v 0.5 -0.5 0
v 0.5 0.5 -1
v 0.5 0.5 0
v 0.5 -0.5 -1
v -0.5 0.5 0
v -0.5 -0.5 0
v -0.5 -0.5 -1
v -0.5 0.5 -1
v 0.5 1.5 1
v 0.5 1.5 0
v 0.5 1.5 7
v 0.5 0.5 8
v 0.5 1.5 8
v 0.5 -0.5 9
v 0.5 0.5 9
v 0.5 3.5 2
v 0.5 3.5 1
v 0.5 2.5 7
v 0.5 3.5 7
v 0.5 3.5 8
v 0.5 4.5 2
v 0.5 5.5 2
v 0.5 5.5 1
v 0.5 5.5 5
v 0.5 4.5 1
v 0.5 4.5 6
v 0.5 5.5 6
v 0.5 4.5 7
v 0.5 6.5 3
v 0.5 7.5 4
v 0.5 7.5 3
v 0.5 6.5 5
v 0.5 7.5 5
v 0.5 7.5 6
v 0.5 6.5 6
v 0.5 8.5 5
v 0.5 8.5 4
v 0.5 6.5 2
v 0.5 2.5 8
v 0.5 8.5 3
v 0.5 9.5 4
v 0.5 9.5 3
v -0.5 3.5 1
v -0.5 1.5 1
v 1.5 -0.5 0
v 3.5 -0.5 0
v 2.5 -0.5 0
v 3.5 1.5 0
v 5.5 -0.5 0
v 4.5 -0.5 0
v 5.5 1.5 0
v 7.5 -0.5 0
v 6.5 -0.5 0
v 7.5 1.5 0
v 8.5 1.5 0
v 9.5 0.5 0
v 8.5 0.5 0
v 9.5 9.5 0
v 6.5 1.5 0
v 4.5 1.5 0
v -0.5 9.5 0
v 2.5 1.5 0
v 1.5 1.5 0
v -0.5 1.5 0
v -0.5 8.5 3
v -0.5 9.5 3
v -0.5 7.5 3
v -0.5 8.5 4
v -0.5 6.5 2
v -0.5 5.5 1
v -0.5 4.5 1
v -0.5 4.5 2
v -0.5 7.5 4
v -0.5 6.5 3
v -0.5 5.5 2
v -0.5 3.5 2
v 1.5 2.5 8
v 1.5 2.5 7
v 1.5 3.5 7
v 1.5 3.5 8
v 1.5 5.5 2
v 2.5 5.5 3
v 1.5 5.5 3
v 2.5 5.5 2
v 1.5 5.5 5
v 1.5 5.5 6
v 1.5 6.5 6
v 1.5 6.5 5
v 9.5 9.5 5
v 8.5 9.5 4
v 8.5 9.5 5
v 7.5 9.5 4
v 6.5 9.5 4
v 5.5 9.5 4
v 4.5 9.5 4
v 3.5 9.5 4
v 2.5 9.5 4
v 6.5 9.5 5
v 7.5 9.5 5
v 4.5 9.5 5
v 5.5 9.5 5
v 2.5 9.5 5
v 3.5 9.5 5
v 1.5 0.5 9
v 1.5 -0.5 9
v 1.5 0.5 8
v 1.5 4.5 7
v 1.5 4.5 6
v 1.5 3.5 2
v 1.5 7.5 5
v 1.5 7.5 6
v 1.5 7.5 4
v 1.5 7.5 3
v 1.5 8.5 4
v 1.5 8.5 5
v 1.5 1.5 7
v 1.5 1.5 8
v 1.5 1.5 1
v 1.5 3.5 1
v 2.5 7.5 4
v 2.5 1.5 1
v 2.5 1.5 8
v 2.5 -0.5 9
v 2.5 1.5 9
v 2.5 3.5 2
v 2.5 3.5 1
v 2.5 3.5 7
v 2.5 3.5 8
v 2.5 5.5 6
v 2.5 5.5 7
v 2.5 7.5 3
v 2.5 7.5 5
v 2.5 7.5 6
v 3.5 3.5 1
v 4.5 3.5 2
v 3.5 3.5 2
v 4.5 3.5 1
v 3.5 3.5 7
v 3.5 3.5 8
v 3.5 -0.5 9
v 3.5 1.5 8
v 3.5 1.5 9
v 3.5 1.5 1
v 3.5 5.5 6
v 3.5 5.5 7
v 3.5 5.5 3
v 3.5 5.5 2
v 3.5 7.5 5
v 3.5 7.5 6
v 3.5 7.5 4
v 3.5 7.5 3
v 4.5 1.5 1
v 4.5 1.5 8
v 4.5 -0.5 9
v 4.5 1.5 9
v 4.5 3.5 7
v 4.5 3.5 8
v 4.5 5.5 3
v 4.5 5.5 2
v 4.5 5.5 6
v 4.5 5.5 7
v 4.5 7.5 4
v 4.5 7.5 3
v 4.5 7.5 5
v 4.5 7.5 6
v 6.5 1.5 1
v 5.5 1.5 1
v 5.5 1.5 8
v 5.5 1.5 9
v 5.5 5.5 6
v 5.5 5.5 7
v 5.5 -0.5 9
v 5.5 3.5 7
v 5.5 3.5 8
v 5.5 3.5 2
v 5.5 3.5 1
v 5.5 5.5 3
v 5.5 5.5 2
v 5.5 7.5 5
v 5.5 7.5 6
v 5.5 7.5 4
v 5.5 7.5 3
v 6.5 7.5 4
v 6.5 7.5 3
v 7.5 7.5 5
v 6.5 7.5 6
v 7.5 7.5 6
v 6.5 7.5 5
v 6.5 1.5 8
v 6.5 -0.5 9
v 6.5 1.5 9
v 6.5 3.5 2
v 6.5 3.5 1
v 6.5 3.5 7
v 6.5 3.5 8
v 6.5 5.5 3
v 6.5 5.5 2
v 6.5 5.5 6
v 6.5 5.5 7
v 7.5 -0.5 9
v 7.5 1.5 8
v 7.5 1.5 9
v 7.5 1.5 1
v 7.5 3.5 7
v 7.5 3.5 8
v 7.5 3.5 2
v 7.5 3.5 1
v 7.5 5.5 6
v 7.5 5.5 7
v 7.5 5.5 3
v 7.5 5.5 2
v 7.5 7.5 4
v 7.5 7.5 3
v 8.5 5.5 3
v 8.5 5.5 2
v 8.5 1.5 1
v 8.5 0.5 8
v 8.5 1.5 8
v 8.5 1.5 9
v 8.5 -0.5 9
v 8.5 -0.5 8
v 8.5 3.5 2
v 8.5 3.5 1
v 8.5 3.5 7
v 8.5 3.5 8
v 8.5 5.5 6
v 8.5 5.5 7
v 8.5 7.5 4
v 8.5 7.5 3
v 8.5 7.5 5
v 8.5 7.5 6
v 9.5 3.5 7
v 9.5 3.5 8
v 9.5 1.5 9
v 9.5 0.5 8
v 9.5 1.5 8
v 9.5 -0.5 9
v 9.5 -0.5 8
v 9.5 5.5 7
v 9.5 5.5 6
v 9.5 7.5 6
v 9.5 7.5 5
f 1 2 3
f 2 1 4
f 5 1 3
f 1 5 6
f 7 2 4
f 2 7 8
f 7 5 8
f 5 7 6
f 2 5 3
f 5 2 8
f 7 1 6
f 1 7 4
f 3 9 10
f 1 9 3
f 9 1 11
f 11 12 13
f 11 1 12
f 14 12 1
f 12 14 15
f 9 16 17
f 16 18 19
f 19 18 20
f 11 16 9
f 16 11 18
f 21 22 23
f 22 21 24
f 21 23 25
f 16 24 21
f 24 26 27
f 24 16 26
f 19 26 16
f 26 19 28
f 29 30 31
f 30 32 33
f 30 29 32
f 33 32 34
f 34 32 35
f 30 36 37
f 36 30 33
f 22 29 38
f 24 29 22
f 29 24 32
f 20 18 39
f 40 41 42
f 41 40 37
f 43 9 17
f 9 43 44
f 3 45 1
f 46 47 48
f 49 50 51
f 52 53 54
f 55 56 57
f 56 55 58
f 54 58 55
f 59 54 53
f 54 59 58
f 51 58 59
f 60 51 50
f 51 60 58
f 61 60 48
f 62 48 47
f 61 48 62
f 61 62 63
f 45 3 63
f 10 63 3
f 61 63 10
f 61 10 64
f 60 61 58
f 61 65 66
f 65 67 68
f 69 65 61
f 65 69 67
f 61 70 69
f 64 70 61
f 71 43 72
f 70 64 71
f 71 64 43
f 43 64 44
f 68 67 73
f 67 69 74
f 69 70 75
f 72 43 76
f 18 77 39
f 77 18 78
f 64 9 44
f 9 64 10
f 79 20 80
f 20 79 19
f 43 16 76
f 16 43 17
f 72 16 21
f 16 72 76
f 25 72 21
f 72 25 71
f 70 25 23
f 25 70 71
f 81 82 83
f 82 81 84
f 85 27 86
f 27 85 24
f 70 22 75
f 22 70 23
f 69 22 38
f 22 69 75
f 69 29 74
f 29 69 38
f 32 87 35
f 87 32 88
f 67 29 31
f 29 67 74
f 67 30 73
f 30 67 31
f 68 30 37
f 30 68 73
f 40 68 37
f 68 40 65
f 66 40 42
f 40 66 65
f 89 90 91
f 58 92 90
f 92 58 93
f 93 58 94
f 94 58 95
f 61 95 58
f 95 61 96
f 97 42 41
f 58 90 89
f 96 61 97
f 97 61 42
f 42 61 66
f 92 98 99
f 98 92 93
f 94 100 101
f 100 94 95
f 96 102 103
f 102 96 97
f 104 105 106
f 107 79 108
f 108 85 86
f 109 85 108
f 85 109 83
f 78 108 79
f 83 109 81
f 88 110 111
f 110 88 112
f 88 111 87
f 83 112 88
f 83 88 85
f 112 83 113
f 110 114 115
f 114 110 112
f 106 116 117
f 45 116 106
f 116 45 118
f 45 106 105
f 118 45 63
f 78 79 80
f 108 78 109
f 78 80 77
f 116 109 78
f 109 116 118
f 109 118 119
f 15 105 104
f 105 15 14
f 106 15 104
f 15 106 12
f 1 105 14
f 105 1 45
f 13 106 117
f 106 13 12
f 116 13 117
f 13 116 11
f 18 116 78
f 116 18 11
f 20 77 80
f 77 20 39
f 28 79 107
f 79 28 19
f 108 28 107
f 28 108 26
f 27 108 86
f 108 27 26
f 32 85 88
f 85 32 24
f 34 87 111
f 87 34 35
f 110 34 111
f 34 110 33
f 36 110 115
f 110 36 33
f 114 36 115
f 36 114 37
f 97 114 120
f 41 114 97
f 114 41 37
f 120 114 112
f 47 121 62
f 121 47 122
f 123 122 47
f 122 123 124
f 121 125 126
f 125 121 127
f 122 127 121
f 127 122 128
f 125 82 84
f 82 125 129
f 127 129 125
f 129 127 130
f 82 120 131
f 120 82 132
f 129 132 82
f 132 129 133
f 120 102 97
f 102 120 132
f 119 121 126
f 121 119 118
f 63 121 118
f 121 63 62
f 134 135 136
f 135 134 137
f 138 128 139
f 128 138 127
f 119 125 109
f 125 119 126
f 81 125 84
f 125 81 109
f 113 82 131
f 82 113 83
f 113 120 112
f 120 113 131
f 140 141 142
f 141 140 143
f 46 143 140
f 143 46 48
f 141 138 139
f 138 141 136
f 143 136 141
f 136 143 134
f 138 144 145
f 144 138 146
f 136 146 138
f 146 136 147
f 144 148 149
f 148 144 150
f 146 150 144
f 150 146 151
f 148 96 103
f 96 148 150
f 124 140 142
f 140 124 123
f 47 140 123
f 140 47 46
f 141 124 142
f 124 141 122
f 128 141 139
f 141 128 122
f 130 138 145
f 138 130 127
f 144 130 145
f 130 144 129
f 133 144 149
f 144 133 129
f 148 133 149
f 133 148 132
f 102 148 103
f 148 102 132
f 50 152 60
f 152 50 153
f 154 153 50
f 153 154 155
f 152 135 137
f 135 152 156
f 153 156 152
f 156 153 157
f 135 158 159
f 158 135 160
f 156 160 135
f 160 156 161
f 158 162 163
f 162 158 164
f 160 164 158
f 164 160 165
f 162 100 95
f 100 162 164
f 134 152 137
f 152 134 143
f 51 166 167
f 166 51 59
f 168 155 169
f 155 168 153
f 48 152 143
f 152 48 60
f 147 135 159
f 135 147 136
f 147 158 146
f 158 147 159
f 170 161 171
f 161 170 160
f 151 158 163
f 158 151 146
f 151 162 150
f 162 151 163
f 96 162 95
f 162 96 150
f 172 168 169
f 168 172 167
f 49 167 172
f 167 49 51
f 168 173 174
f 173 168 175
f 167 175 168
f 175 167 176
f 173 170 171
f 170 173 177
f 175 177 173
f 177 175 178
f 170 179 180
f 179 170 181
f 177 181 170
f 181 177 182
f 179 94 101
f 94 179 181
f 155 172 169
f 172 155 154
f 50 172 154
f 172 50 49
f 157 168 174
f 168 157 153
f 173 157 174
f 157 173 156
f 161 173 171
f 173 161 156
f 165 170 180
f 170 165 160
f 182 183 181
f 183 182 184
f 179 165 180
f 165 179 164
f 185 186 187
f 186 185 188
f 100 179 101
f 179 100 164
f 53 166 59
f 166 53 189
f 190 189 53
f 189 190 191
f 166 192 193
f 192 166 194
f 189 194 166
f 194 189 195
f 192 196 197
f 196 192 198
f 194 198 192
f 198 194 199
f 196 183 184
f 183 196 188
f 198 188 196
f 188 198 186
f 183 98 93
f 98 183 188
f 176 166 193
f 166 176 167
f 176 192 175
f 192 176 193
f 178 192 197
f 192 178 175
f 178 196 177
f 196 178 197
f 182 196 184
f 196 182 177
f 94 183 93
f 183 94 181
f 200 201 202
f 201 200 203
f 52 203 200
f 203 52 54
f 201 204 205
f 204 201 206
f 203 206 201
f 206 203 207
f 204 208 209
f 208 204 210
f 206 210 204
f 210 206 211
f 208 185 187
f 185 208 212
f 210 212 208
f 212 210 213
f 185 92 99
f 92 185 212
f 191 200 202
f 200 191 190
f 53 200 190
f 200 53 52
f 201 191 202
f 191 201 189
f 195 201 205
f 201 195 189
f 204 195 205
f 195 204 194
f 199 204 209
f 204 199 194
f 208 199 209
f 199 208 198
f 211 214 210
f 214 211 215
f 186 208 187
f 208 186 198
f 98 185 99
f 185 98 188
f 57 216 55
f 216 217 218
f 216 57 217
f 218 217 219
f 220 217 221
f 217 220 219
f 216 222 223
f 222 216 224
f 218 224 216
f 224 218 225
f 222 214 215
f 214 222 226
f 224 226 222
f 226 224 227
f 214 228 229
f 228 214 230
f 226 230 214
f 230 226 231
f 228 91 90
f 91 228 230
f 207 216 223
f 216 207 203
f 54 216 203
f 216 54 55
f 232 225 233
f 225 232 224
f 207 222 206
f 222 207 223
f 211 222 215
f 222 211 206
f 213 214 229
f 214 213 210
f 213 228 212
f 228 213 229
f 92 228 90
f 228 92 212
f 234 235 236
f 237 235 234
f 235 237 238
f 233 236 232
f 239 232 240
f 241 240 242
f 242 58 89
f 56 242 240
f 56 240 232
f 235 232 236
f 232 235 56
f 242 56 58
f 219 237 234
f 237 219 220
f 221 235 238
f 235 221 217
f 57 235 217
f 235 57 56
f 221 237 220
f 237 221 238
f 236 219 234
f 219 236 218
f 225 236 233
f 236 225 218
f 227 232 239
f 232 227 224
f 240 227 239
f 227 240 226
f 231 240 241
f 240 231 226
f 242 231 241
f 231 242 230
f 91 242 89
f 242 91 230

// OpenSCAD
union() {
    translate([0, 0, -0.5]) color([1, 0, 0]) cube([1, 1, 1], center=true);
    translate([0, 2, 0.5]) cube([1, 1, 1], center=true);
    translate([0, 3, 0.5]) cube([1, 1, 1], center=true);
    translate([0, 4, 1.0]) cube([1, 1, 2], center=true);
    translate([0, 5, 0.5]) cube([1, 1, 1], center=true);
    translate([0, 6, 1.0]) cube([1, 1, 2], center=true);
    translate([0, 7, 1.5]) cube([1, 1, 3], center=true);
    translate([0, 8, 2.0]) cube([1, 1, 4], center=true);
    translate([0, 9, 1.5]) cube([1, 1, 3], center=true);
    translate([1, 0, 4.5]) cube([1, 1, 9], center=true);
    translate([1, 1, 4.0]) cube([1, 1, 8], center=true);
    translate([1, 2, 3.5]) cube([1, 1, 7], center=true);
    translate([1, 3, 4.0]) cube([1, 1, 8], center=true);
    translate([1, 4, 3.5]) cube([1, 1, 7], center=true);
    translate([1, 5, 3.0]) cube([1, 1, 6], center=true);
    translate([1, 6, 2.5]) cube([1, 1, 5], center=true);
    translate([1, 7, 3.0]) cube([1, 1, 6], center=true);
    translate([1, 8, 2.5]) cube([1, 1, 5], center=true);
    translate([1, 9, 2.0]) cube([1, 1, 4], center=true);
    translate([2, 2, 0.5]) cube([1, 1, 1], center=true);
    translate([2, 3, 0.5]) cube([1, 1, 1], center=true);
    translate([2, 4, 1.0]) cube([1, 1, 2], center=true);
    translate([2, 5, 1.0]) cube([1, 1, 2], center=true);
    translate([2, 6, 1.5]) cube([1, 1, 3], center=true);
    translate([2, 7, 1.5]) cube([1, 1, 3], center=true);
    translate([2, 8, 2.0]) cube([1, 1, 4], center=true);
    translate([2, 9, 2.0]) cube([1, 1, 4], center=true);
    translate([3, 0, 4.5]) cube([1, 1, 9], center=true);
    translate([3, 1, 4.5]) cube([1, 1, 9], center=true);
    translate([3, 2, 4.0]) cube([1, 1, 8], center=true);
    translate([3, 3, 4.0]) cube([1, 1, 8], center=true);
    translate([3, 4, 3.5]) cube([1, 1, 7], center=true);
    translate([3, 5, 3.5]) cube([1, 1, 7], center=true);
    translate([3, 6, 3.0]) cube([1, 1, 6], center=true);
    translate([3, 7, 3.0]) cube([1, 1, 6], center=true);
    translate([3, 8, 2.5]) cube([1, 1, 5], center=true);
    translate([3, 9, 2.5]) cube([1, 1, 5], center=true);
    translate([4, 2, 0.5]) cube([1, 1, 1], center=true);
    translate([4, 3, 0.5]) cube([1, 1, 1], center=true);
    translate([4, 4, 1.0]) cube([1, 1, 2], center=true);
    translate([4, 5, 1.0]) cube([1, 1, 2], center=true);
    translate([4, 6, 1.5]) cube([1, 1, 3], center=true);
    translate([4, 7, 1.5]) cube([1, 1, 3], center=true);
    translate([4, 8, 2.0]) cube([1, 1, 4], center=true);
    translate([4, 9, 2.0]) cube([1, 1, 4], center=true);
    translate([5, 0, 4.5]) cube([1, 1, 9], center=true);
    translate([5, 1, 4.5]) cube([1, 1, 9], center=true);
    translate([5, 2, 4.0]) cube([1, 1, 8], center=true);
    translate([5, 3, 4.0]) cube([1, 1, 8], center=true);
    translate([5, 4, 3.5]) cube([1, 1, 7], center=true);
    translate([5, 5, 3.5]) cube([1, 1, 7], center=true);
    translate([5, 6, 3.0]) cube([1, 1, 6], center=true);
    translate([5, 7, 3.0]) cube([1, 1, 6], center=true);
    translate([5, 8, 2.5]) cube([1, 1, 5], center=true);
    translate([5, 9, 2.5]) cube([1, 1, 5], center=true);
    translate([6, 2, 0.5]) cube([1, 1, 1], center=true);
    translate([6, 3, 0.5]) cube([1, 1, 1], center=true);
    translate([6, 4, 1.0]) cube([1, 1, 2], center=true);
    translate([6, 5, 1.0]) cube([1, 1, 2], center=true);
    translate([6, 6, 1.5]) cube([1, 1, 3], center=true);
    translate([6, 7, 1.5]) cube([1, 1, 3], center=true);
    translate([6, 8, 2.0]) cube([1, 1, 4], center=true);
    translate([6, 9, 2.0]) cube([1, 1, 4], center=true);
    translate([7, 0, 4.5]) cube([1, 1, 9], center=true);
    translate([7, 1, 4.5]) cube([1, 1, 9], center=true);
    translate([7, 2, 4.0]) cube([1, 1, 8], center=true);
    translate([7, 3, 4.0]) cube([1, 1, 8], center=true);
    translate([7, 4, 3.5]) cube([1, 1, 7], center=true);
    translate([7, 5, 3.5]) cube([1, 1, 7], center=true);
    translate([7, 6, 3.0]) cube([1, 1, 6], center=true);
    translate([7, 7, 3.0]) cube([1, 1, 6], center=true);
    translate([7, 8, 2.5]) cube([1, 1, 5], center=true);
    translate([7, 9, 2.5]) cube([1, 1, 5], center=true);
    translate([8, 2, 0.5]) cube([1, 1, 1], center=true);
    translate([8, 3, 0.5]) cube([1, 1, 1], center=true);
    translate([8, 4, 1.0]) cube([1, 1, 2], center=true);
    translate([8, 5, 1.0]) cube([1, 1, 2], center=true);
    translate([8, 6, 1.5]) cube([1, 1, 3], center=true);
    translate([8, 7, 1.5]) cube([1, 1, 3], center=true);
    translate([8, 8, 2.0]) cube([1, 1, 4], center=true);
    translate([8, 9, 2.0]) cube([1, 1, 4], center=true);
    translate([9, 0, 8.5]) color([0, 0, 1]) cube([1, 1, 1], center=true);
    translate([9, 1, 4.5]) cube([1, 1, 9], center=true);
    translate([9, 2, 4.0]) cube([1, 1, 8], center=true);
    translate([9, 3, 4.0]) cube([1, 1, 8], center=true);
    translate([9, 4, 3.5]) cube([1, 1, 7], center=true);
    translate([9, 5, 3.5]) cube([1, 1, 7], center=true);
    translate([9, 6, 3.0]) cube([1, 1, 6], center=true);
    translate([9, 7, 3.0]) cube([1, 1, 6], center=true);
    translate([9, 8, 2.5]) cube([1, 1, 5], center=true);
    translate([9, 9, 2.5]) cube([1, 1, 5], center=true);
}
